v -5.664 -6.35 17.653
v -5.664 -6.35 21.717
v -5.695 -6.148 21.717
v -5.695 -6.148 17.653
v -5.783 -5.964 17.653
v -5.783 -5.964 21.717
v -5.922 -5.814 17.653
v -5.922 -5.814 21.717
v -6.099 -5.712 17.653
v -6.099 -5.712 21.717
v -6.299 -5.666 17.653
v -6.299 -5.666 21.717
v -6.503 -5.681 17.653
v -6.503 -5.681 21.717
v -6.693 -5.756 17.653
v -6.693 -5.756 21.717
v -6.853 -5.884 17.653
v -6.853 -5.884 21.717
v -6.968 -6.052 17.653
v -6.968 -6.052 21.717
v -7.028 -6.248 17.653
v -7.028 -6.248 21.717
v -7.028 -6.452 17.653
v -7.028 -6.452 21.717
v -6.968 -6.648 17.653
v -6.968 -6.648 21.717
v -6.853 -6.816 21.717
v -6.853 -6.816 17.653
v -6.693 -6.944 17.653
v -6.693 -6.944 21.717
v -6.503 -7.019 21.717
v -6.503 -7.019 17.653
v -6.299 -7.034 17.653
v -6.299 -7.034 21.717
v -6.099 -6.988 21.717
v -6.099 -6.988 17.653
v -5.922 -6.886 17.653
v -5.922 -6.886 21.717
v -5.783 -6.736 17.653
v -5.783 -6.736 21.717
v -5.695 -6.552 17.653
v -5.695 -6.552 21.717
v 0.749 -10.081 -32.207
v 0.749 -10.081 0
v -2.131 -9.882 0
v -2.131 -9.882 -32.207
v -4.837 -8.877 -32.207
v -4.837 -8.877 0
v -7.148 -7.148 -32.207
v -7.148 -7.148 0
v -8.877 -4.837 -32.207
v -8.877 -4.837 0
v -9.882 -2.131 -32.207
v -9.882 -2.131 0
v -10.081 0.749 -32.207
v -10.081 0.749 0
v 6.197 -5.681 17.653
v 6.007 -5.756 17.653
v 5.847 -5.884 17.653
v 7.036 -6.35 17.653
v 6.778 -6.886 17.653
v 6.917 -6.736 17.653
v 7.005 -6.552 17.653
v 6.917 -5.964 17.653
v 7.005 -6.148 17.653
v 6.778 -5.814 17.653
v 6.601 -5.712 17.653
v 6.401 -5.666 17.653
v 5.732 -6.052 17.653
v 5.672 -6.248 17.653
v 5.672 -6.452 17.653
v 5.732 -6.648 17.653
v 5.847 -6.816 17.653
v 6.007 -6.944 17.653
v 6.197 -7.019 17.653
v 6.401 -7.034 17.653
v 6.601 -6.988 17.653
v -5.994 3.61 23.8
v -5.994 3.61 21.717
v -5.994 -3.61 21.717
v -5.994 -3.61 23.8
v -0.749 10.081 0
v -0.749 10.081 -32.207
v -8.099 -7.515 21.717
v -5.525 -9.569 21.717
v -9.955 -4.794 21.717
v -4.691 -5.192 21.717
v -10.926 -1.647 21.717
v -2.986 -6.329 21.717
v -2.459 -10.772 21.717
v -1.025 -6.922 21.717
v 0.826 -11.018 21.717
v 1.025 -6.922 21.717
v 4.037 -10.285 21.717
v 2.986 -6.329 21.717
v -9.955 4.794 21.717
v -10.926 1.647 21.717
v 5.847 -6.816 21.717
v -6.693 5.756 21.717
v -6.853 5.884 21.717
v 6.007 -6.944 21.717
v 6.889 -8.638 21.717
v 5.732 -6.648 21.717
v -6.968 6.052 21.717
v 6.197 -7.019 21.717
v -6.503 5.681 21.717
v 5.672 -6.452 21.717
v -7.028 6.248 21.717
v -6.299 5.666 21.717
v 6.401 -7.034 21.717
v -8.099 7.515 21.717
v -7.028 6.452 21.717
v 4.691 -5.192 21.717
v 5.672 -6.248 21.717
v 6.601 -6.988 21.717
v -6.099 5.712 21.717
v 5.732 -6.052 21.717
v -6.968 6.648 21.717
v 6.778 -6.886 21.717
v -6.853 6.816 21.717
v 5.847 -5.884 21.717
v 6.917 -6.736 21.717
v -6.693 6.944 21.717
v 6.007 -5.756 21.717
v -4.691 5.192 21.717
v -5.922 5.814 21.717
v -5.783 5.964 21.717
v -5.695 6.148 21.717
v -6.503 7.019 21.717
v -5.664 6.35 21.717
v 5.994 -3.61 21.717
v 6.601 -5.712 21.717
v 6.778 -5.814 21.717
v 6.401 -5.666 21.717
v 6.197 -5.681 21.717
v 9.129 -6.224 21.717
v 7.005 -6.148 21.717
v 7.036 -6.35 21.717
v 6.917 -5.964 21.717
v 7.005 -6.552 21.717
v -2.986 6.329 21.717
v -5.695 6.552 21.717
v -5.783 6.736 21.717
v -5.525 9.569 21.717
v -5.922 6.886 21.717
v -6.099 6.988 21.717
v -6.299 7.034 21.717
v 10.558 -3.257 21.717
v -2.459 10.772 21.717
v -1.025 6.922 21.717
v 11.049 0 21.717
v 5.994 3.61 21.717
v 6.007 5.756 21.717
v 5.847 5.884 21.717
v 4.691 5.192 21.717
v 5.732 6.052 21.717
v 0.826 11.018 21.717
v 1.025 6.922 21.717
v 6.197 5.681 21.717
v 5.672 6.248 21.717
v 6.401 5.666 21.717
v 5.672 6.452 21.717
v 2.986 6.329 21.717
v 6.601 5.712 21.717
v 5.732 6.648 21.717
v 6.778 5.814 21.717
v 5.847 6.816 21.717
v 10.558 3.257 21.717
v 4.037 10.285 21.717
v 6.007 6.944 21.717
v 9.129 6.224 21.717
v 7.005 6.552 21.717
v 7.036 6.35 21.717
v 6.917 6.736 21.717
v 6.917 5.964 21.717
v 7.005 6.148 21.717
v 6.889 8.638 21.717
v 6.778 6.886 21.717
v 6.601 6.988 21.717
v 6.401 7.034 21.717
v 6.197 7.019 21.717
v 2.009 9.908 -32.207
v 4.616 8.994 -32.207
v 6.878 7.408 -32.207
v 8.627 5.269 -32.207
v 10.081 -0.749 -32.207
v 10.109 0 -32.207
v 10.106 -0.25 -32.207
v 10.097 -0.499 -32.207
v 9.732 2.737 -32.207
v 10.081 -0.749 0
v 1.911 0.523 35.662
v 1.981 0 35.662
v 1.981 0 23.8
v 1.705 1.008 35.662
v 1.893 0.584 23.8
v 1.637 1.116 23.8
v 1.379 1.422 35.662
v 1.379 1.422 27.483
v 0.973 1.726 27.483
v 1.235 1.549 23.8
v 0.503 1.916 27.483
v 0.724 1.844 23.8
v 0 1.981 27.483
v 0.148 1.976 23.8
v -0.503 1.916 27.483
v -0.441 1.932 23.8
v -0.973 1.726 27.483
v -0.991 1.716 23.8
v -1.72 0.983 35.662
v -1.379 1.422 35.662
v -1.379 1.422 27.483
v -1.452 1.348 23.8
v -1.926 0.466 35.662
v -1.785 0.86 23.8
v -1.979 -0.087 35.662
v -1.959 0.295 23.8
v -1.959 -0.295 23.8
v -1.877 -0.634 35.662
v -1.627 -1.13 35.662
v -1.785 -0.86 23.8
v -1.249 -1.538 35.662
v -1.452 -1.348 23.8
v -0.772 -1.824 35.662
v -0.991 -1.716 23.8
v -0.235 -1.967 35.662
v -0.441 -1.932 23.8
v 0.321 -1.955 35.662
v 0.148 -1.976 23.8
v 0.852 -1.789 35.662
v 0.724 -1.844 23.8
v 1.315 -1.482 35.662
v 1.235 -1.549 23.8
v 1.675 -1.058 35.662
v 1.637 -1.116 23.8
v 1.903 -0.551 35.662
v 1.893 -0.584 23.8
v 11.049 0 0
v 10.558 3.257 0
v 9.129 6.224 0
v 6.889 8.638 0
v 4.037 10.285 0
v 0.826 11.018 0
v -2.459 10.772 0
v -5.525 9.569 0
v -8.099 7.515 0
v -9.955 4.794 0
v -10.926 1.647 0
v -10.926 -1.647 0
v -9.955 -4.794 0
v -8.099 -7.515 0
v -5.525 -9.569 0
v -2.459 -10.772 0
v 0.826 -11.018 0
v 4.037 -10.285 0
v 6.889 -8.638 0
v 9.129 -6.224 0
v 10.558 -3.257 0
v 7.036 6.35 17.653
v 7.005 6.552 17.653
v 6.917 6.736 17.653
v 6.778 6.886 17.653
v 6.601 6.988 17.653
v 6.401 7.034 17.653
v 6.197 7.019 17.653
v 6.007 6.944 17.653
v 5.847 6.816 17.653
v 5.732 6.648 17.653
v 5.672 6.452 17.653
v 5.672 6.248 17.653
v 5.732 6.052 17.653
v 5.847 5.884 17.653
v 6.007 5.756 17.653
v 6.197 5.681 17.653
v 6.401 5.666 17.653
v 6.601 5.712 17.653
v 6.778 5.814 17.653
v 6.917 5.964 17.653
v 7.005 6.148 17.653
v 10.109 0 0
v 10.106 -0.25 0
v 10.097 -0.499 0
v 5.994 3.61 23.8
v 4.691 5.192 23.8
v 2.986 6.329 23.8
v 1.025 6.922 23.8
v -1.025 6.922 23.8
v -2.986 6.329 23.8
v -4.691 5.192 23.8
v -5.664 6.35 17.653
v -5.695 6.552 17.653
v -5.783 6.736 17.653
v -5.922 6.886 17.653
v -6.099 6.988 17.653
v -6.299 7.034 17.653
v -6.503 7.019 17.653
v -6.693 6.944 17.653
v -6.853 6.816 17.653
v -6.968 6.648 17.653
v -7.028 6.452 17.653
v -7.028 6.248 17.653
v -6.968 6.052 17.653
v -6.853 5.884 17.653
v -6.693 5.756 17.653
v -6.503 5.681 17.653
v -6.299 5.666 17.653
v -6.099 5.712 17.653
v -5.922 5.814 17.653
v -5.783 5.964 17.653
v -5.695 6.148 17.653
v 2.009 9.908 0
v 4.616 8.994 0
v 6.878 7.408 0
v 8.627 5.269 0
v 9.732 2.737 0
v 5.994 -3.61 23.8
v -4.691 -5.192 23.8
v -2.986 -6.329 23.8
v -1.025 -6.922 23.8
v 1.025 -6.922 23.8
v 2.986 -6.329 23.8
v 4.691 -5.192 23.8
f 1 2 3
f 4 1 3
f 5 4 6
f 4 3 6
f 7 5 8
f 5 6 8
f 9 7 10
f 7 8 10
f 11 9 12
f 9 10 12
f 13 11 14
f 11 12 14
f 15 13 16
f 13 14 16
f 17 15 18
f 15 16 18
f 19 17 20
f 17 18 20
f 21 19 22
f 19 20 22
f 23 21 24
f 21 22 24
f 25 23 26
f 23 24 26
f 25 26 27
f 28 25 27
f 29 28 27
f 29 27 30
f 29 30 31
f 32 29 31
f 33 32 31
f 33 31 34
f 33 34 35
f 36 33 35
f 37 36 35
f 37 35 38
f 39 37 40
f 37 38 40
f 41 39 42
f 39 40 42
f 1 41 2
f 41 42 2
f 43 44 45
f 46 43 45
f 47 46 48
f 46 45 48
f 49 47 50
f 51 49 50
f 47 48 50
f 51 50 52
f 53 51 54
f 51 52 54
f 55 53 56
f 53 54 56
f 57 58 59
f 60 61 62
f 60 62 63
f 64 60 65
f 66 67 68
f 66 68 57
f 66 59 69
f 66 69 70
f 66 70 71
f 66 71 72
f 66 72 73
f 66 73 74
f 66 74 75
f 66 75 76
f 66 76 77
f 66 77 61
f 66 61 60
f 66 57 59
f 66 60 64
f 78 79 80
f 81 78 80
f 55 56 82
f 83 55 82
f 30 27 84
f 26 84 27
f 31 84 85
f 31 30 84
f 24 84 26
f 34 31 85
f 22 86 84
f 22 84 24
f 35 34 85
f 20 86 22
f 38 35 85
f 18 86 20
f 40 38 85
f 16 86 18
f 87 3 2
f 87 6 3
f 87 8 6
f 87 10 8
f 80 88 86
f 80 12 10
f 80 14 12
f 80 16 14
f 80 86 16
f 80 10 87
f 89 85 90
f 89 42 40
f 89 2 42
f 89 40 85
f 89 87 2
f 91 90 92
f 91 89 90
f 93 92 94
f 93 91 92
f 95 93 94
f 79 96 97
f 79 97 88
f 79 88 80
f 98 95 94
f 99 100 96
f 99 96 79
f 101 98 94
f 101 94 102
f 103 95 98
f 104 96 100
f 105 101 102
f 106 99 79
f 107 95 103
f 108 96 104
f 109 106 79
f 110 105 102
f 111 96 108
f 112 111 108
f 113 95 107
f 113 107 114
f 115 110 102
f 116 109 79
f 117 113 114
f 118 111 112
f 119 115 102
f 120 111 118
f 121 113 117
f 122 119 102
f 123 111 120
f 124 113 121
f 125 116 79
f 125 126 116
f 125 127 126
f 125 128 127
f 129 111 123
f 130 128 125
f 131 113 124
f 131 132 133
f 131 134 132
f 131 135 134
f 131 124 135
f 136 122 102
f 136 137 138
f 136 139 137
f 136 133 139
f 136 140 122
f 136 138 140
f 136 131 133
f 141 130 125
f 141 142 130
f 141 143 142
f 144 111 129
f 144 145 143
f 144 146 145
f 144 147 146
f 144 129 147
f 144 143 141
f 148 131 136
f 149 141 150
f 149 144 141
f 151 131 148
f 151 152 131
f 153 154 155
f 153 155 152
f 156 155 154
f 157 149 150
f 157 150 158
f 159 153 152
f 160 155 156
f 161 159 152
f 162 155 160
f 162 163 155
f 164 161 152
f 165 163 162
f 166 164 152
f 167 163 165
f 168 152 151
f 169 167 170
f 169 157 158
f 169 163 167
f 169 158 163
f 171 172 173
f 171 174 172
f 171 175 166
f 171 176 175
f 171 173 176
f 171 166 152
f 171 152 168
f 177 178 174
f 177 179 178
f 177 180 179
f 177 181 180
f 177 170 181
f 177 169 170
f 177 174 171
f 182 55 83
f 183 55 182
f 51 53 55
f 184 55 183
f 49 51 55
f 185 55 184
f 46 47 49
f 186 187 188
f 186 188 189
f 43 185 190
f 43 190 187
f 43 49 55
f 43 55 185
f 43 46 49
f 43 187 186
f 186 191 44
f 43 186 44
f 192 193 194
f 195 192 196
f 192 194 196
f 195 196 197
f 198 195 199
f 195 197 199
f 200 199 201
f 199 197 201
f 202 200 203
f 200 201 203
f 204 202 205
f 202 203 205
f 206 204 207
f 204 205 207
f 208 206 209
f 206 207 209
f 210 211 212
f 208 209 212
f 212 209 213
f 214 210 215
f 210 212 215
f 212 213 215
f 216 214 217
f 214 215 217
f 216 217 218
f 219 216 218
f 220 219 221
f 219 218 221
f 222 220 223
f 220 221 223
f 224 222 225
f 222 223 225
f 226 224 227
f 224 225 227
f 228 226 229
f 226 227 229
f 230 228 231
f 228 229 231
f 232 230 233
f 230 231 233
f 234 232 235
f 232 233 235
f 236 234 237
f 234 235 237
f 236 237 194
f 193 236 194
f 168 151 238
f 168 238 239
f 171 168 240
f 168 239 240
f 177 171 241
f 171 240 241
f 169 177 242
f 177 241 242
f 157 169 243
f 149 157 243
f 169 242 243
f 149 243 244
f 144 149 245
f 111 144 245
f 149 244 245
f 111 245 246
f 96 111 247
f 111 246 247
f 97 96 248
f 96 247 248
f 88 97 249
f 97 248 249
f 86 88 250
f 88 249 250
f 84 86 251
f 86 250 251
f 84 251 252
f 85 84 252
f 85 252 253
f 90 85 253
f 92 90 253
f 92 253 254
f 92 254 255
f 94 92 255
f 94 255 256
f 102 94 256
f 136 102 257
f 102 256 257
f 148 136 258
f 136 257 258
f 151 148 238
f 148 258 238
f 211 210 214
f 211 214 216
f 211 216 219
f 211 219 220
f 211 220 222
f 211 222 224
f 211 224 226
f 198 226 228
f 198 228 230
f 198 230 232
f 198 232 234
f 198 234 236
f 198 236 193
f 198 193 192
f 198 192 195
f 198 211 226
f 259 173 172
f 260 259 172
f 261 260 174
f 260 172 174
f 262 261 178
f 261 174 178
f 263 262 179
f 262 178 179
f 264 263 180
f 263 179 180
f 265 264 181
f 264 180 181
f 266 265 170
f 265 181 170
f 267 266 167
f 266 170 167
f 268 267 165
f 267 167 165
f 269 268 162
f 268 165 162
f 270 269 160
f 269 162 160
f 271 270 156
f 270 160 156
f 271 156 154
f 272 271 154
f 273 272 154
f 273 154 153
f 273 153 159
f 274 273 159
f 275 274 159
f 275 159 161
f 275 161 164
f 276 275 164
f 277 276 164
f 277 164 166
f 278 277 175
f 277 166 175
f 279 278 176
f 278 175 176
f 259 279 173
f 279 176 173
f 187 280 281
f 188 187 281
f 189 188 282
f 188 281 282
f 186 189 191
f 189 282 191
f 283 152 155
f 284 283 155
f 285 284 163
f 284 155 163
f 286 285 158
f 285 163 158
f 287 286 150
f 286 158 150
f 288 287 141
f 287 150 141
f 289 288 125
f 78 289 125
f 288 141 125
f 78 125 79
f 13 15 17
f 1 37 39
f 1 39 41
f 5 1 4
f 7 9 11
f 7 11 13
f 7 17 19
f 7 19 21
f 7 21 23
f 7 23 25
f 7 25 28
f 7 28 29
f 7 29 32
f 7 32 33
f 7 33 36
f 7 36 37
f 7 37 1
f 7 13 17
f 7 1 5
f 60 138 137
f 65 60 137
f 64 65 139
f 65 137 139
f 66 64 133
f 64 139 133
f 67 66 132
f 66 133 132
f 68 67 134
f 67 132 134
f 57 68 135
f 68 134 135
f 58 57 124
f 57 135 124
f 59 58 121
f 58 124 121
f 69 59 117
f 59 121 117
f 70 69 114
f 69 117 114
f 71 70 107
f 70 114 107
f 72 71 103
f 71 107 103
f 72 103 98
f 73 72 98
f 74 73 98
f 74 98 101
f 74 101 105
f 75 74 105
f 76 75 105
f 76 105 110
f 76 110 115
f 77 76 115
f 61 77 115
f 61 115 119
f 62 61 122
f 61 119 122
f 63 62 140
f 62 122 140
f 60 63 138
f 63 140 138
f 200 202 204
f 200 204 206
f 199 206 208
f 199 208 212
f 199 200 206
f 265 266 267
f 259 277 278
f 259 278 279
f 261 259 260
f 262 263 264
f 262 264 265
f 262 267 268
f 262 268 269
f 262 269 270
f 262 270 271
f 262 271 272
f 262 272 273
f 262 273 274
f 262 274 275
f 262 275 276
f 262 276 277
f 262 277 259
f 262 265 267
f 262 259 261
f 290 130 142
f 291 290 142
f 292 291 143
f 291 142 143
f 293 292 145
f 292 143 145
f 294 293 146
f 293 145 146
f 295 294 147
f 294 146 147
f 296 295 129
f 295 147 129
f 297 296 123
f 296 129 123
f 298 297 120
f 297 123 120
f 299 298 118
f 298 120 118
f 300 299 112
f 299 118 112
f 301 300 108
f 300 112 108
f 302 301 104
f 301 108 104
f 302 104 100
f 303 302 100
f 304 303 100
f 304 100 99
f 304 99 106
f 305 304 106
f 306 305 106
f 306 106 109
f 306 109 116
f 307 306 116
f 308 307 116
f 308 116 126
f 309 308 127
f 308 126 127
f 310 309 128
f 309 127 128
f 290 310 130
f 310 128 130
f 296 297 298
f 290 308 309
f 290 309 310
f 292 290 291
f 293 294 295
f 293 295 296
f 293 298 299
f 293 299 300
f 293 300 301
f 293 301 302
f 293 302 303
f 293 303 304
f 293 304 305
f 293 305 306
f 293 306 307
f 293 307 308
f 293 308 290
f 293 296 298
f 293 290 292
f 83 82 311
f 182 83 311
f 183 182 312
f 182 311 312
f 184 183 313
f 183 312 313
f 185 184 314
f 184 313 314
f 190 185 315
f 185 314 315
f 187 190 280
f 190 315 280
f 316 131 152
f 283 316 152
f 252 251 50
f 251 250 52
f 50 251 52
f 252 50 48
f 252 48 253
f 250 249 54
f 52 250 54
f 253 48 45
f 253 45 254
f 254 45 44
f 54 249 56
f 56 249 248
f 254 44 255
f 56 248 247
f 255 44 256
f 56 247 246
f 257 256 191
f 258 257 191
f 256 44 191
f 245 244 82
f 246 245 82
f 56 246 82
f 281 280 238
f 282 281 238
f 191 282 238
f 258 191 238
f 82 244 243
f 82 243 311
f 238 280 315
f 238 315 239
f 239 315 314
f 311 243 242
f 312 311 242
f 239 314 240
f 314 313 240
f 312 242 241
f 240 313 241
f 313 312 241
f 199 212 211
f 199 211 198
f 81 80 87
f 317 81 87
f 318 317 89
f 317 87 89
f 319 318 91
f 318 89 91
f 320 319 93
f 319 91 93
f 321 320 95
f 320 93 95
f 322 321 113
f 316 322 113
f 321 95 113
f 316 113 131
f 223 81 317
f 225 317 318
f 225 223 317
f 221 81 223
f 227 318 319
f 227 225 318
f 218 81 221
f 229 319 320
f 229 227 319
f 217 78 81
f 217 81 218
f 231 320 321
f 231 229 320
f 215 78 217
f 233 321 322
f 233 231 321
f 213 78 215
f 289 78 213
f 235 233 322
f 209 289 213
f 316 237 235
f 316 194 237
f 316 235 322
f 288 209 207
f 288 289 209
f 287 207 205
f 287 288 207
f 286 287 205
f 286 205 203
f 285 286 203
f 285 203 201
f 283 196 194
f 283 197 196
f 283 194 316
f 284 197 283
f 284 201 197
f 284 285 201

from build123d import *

# Parameters (mm, degrees)
F0_R      = 11.049
F1_DEPTH  = 21.717
F3_DEPTH  = 2.0828
F4_R      = 1.9812
F5_DEPTH  = 11.8618
F7_DEPTH  = 8.1788
F8_R      = 0.6858
F9_DEPTH  = 4.064
F11_DEPTH = 32.2072


with BuildPart() as f1:
    # F0 (on Top) → F1 (new body)
    with BuildSketch(Plane.XY):
        Circle(F0_R)
    extrude(amount=F1_DEPTH)

    # F2 (on face) → F3 (join)
    with BuildSketch(Plane.XY.offset(21.717)):
        with BuildLine():
            Line((5.9944, -3.610398), (5.9944, 3.610398))
            ThreePointArc((5.9944, 3.610398), (0, 6.9977), (-5.9944, 3.610398))
            Line((-5.9944, 3.610398), (-5.9944, -3.610398))
            ThreePointArc((-5.9944, -3.610398), (0, -6.9977), (5.9944, -3.610398))
        make_face()
    extrude(amount=F3_DEPTH)

    # F4 (on face) → F5 (join)
    with BuildSketch(Plane.XY.offset(23.7998)):
        Circle(F4_R)
    extrude(amount=F5_DEPTH)

    # F6 (on face) → F7 (cut)
    with BuildSketch(Plane.XY.offset(35.6616)):
        with BuildLine():
            ThreePointArc((1.379105, 1.4224), (0, 1.9812), (-1.379105, 1.4224))
            Line((-1.379105, 1.4224), (1.379105, 1.4224))
        make_face()
    extrude(amount=-F7_DEPTH, mode=Mode.SUBTRACT)

    # F8 (on face) → F9 (cut)
    with BuildSketch(Plane.XY.offset(21.717)):
        with Locations((-6.35, 6.35)):
            Circle(F8_R)
        with Locations((6.35, 6.35)):
            Circle(F8_R)
        with Locations((6.35, -6.35)):
            Circle(F8_R)
        with Locations((-6.35, -6.35)):
            Circle(F8_R)
    extrude(amount=-F9_DEPTH, mode=Mode.SUBTRACT)

    # F10 (on face) → F11 (join)
    with BuildSketch(Plane(origin=(0, 0, 0), x_dir=(1, 0, 0), z_dir=(0, 0, -1))):
        with BuildLine():
            ThreePointArc((-0.748756, -10.081433), (6.878466, -7.408281), (10.1092, 0))
            ThreePointArc((10.1092, 0), (10.102256, 0.374635), (10.081433, 0.748756))
            Line((10.081433, 0.748756), (0.748756, 10.081433))
            ThreePointArc((0.748756, 10.081433), (-7.148284, 7.148284), (-10.081433, -0.748756))
            Line((-10.081433, -0.748756), (-0.748756, -10.081433))
        make_face()
    extrude(amount=F11_DEPTH)


solid = f1.part
